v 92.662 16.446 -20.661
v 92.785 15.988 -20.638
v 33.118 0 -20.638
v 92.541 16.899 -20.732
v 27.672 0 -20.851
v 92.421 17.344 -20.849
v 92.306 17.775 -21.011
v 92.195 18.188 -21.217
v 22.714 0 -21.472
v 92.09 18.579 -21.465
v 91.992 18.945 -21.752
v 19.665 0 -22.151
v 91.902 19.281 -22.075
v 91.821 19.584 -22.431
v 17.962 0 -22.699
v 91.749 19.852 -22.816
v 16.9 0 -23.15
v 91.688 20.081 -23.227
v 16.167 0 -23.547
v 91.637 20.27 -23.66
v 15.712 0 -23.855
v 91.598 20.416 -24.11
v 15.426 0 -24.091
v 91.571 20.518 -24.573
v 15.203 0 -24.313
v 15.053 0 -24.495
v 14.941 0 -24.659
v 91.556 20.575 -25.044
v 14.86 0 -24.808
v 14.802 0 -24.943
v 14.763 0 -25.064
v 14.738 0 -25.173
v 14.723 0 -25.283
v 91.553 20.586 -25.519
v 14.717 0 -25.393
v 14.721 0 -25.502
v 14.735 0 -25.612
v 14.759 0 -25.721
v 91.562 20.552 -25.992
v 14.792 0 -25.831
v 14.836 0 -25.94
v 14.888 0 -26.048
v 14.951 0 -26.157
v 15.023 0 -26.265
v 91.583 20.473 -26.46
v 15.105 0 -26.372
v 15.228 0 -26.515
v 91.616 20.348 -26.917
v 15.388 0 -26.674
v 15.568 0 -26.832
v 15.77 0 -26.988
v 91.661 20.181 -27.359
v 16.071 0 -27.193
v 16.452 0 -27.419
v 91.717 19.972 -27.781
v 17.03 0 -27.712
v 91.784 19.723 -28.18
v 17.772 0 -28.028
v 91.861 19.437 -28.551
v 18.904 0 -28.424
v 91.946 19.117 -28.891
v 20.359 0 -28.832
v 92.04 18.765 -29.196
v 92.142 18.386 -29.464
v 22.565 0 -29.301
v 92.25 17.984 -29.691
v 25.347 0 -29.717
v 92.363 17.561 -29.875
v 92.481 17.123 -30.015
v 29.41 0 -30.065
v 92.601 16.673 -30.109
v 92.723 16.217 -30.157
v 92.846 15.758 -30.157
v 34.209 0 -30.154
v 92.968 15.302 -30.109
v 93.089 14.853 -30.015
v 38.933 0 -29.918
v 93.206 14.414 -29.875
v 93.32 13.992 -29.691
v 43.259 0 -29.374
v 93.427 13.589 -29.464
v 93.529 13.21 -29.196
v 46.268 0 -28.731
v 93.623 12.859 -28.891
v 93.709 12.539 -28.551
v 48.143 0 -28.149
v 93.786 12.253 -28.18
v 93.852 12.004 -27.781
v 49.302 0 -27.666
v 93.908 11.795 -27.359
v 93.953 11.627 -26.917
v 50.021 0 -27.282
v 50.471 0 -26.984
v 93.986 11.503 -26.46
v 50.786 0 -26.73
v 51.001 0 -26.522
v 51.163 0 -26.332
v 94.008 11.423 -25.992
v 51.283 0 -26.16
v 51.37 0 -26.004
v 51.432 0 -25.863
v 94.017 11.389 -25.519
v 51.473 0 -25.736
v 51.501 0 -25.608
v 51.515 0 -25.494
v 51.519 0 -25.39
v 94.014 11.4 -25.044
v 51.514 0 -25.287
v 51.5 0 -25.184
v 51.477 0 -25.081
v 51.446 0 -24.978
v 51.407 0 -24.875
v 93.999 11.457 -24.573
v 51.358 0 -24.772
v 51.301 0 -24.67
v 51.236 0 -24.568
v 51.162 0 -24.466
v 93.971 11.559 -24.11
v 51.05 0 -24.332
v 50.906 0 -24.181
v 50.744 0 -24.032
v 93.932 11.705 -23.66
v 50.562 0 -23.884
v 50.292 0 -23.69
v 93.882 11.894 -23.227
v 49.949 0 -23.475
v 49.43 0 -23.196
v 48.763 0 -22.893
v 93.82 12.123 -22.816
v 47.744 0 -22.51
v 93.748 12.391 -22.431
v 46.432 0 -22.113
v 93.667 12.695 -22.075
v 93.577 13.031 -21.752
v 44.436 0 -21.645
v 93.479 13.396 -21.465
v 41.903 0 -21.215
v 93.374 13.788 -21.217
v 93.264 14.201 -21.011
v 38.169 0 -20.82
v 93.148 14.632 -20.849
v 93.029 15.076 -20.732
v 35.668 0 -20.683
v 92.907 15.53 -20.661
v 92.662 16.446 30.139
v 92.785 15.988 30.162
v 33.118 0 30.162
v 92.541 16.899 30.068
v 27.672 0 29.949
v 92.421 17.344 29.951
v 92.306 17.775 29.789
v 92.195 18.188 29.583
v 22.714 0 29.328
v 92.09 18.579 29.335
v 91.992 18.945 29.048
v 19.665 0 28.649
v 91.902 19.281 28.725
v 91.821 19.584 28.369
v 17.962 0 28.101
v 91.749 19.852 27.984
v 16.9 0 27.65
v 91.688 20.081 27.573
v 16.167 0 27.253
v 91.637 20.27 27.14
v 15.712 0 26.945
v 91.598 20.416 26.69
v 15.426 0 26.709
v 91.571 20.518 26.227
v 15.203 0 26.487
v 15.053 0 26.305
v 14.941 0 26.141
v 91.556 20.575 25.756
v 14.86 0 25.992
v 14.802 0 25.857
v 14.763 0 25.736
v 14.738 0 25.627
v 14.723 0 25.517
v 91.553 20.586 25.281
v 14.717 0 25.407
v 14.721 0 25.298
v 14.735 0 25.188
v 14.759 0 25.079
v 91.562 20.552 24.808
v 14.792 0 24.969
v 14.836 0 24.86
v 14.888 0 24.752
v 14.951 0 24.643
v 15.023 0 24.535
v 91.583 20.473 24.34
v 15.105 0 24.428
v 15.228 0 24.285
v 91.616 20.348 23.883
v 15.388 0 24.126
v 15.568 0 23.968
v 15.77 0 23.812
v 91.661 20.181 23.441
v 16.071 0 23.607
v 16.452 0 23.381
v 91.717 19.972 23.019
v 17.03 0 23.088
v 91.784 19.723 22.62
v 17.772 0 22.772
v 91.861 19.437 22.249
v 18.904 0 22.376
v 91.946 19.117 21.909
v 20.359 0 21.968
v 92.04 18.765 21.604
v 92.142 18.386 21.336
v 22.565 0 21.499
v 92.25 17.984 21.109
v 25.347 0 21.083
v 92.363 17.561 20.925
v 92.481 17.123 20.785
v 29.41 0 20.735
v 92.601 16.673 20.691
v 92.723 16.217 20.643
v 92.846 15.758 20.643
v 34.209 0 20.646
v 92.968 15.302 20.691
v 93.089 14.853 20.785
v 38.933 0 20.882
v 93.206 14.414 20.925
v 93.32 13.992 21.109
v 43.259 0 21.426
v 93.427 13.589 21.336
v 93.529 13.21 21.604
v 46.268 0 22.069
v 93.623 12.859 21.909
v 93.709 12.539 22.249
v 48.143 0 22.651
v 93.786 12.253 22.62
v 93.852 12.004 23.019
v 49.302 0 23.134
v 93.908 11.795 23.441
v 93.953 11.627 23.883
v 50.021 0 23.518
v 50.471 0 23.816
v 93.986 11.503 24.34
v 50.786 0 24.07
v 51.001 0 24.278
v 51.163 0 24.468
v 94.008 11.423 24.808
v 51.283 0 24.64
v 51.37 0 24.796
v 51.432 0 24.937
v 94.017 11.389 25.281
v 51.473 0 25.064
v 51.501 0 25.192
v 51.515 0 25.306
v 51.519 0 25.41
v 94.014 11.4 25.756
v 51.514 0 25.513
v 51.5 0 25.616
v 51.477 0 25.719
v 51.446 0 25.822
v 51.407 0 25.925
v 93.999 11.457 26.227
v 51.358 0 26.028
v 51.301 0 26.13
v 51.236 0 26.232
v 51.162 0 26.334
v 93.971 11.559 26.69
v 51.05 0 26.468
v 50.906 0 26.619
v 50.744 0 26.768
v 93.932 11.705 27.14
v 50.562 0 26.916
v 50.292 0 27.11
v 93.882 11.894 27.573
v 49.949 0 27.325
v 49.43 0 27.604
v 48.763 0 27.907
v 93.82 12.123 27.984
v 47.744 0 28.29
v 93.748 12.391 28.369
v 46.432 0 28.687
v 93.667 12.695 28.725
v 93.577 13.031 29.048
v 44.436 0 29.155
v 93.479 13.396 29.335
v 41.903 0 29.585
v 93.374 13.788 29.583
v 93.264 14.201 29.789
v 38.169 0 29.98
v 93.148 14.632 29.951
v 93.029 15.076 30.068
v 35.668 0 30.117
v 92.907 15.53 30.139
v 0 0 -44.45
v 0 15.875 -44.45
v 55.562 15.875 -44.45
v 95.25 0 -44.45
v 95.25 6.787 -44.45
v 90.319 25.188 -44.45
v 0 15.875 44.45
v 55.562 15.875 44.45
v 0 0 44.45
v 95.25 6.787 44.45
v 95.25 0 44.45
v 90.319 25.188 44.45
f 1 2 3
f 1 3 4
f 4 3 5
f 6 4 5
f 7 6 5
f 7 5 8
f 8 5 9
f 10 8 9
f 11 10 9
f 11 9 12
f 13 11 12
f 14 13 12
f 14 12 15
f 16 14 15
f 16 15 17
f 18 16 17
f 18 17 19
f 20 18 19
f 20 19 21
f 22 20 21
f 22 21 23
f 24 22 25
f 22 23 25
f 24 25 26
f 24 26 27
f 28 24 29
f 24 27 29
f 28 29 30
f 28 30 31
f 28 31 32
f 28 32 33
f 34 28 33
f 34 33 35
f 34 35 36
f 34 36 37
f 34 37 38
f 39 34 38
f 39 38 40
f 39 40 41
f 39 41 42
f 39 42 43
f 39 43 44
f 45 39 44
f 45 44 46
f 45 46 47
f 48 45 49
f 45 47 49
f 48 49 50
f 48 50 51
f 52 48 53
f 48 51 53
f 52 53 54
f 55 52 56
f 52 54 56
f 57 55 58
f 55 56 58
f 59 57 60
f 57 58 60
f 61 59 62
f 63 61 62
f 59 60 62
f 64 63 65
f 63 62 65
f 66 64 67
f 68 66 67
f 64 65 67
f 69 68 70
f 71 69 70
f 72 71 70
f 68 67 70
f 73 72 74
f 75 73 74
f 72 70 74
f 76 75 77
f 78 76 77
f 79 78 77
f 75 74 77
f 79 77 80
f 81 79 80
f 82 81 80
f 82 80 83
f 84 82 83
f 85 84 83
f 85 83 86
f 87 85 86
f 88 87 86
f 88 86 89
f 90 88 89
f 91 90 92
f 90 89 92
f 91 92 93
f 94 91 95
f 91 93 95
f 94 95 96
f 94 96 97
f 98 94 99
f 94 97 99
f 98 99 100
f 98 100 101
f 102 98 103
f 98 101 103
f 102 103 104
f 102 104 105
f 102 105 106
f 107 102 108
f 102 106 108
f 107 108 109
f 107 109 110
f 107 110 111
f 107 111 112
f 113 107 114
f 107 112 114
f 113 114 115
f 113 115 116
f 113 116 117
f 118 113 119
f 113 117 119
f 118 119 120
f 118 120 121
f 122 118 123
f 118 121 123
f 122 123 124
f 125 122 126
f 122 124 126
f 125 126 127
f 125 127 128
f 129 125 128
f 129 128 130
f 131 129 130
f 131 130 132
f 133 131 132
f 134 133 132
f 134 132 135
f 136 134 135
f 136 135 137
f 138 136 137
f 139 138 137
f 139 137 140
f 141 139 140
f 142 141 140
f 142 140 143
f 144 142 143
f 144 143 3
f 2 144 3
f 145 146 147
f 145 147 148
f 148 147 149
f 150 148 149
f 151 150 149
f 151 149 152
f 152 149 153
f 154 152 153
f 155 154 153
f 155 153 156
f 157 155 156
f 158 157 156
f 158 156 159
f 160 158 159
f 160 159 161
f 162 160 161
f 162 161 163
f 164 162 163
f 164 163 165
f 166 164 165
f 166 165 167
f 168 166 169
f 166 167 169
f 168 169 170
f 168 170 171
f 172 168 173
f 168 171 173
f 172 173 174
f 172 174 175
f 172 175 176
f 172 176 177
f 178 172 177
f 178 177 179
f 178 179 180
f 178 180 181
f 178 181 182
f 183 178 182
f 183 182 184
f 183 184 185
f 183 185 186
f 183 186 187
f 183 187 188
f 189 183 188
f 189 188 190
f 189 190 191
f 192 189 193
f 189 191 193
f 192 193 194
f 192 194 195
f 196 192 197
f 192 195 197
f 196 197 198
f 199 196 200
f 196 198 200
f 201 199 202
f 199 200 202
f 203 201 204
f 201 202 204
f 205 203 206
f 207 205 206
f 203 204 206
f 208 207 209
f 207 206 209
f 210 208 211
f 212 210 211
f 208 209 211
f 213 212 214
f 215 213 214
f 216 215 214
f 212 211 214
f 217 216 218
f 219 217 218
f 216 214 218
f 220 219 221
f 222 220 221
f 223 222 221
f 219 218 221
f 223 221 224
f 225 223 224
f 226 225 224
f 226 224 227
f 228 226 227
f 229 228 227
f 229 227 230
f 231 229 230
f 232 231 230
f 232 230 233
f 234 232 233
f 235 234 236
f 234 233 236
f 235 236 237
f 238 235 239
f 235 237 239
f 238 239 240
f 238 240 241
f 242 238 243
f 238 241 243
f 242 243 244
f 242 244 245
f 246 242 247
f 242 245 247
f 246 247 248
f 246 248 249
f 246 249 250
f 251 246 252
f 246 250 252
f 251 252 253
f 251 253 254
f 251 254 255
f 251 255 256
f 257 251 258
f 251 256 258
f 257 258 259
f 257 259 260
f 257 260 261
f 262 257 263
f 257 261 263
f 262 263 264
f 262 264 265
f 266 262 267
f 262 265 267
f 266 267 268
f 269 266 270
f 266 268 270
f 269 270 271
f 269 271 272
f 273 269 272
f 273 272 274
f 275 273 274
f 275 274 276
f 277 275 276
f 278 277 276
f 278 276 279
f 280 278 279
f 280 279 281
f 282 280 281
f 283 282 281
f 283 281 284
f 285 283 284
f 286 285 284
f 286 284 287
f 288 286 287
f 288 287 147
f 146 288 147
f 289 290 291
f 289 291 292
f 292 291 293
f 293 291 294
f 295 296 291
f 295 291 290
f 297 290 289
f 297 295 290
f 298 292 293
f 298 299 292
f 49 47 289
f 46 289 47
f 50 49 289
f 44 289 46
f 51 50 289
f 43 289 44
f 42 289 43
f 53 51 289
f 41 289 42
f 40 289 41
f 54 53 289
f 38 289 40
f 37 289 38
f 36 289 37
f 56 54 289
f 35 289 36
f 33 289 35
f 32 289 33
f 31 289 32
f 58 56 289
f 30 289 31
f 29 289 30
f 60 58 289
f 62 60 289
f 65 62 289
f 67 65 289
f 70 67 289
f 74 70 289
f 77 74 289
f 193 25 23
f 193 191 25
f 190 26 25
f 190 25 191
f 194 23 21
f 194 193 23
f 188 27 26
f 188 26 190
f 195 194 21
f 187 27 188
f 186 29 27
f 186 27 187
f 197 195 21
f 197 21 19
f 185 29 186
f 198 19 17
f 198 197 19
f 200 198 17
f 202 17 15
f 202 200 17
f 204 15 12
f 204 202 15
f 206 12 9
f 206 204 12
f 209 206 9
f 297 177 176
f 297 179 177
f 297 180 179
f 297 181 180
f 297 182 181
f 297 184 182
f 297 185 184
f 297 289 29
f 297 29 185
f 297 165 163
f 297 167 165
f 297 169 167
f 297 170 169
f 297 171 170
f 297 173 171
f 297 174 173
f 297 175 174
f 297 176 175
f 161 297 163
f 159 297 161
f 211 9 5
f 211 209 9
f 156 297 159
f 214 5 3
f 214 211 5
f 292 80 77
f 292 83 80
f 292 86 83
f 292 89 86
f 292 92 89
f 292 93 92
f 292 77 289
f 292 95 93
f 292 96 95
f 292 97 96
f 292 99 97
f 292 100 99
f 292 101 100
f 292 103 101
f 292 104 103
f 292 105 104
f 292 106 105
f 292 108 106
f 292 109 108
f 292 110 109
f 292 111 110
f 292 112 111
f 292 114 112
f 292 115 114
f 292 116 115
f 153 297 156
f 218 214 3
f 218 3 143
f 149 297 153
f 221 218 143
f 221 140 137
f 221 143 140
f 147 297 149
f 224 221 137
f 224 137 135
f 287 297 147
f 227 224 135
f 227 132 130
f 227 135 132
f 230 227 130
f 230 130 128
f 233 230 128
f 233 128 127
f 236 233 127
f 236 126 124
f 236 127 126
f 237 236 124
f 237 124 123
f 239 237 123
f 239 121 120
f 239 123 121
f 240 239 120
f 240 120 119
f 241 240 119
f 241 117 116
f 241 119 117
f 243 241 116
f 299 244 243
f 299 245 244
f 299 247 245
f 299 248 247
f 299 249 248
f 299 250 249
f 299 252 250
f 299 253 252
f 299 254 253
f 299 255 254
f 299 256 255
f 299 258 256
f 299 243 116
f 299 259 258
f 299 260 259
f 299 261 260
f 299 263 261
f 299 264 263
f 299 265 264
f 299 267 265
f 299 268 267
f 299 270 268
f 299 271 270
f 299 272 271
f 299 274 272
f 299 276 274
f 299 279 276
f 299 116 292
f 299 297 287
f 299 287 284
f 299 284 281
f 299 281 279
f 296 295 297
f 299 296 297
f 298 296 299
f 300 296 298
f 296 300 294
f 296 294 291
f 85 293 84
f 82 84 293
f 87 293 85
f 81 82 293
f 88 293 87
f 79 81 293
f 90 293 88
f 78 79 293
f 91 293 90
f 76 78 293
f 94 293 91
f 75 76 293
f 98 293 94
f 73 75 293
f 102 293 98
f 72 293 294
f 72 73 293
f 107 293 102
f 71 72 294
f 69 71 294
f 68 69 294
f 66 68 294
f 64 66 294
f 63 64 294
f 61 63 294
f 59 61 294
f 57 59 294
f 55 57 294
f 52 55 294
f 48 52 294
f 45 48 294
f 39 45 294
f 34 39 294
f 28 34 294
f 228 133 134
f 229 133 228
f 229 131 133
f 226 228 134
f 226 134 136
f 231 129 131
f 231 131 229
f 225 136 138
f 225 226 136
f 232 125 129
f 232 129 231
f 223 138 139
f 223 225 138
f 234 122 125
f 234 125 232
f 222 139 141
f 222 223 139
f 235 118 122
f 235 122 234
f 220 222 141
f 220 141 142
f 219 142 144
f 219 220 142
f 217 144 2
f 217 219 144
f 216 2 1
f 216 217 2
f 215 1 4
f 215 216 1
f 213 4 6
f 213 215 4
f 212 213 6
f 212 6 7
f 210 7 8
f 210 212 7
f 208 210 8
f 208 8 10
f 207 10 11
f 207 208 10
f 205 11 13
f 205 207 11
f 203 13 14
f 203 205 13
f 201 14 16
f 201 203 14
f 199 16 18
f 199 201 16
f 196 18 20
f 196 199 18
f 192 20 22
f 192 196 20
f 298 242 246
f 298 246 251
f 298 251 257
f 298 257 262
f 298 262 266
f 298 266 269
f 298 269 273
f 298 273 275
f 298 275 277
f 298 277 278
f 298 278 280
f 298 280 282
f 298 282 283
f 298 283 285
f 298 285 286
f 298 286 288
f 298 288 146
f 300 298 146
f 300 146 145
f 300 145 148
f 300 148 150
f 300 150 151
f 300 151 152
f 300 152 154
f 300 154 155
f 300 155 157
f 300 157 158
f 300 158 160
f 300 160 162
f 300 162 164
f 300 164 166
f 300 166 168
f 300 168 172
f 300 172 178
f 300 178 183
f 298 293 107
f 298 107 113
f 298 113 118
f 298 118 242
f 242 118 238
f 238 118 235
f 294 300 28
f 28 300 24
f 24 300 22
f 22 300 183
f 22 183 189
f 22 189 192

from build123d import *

# Parameters (mm, degrees)
BOSS_EXTRUDE1_DEPTH          = 44.45
F_3_8_0_375_DIAMETER_HOLE1_D = 9.525


with BuildPart() as part:
    # Sketch1 → Boss-Extrude1 (new, symmetric)
    with BuildSketch(Plane.XY):
        Polygon((95.25, 0), (95.25, 6.787222338), (90.319497191, 25.188109329), (55.5625, 15.875), (0, 15.875), (0, 0), align=None)
    extrude(amount=BOSS_EXTRUDE1_DEPTH, both=True)

    # 3/8 (0.375) Diameter Hole1 (through all)
    with Locations(Plane(origin=(90.56626544, 24.267157686, 0), x_dir=(0, 0, -1), z_dir=(0.9659258262890682, 0.2588190451025212, 0))):
        with Locations((-25.4, -8.571560701), (25.4, -8.571560701)):
            Hole(F_3_8_0_375_DIAMETER_HOLE1_D / 2)


solid = part.part
